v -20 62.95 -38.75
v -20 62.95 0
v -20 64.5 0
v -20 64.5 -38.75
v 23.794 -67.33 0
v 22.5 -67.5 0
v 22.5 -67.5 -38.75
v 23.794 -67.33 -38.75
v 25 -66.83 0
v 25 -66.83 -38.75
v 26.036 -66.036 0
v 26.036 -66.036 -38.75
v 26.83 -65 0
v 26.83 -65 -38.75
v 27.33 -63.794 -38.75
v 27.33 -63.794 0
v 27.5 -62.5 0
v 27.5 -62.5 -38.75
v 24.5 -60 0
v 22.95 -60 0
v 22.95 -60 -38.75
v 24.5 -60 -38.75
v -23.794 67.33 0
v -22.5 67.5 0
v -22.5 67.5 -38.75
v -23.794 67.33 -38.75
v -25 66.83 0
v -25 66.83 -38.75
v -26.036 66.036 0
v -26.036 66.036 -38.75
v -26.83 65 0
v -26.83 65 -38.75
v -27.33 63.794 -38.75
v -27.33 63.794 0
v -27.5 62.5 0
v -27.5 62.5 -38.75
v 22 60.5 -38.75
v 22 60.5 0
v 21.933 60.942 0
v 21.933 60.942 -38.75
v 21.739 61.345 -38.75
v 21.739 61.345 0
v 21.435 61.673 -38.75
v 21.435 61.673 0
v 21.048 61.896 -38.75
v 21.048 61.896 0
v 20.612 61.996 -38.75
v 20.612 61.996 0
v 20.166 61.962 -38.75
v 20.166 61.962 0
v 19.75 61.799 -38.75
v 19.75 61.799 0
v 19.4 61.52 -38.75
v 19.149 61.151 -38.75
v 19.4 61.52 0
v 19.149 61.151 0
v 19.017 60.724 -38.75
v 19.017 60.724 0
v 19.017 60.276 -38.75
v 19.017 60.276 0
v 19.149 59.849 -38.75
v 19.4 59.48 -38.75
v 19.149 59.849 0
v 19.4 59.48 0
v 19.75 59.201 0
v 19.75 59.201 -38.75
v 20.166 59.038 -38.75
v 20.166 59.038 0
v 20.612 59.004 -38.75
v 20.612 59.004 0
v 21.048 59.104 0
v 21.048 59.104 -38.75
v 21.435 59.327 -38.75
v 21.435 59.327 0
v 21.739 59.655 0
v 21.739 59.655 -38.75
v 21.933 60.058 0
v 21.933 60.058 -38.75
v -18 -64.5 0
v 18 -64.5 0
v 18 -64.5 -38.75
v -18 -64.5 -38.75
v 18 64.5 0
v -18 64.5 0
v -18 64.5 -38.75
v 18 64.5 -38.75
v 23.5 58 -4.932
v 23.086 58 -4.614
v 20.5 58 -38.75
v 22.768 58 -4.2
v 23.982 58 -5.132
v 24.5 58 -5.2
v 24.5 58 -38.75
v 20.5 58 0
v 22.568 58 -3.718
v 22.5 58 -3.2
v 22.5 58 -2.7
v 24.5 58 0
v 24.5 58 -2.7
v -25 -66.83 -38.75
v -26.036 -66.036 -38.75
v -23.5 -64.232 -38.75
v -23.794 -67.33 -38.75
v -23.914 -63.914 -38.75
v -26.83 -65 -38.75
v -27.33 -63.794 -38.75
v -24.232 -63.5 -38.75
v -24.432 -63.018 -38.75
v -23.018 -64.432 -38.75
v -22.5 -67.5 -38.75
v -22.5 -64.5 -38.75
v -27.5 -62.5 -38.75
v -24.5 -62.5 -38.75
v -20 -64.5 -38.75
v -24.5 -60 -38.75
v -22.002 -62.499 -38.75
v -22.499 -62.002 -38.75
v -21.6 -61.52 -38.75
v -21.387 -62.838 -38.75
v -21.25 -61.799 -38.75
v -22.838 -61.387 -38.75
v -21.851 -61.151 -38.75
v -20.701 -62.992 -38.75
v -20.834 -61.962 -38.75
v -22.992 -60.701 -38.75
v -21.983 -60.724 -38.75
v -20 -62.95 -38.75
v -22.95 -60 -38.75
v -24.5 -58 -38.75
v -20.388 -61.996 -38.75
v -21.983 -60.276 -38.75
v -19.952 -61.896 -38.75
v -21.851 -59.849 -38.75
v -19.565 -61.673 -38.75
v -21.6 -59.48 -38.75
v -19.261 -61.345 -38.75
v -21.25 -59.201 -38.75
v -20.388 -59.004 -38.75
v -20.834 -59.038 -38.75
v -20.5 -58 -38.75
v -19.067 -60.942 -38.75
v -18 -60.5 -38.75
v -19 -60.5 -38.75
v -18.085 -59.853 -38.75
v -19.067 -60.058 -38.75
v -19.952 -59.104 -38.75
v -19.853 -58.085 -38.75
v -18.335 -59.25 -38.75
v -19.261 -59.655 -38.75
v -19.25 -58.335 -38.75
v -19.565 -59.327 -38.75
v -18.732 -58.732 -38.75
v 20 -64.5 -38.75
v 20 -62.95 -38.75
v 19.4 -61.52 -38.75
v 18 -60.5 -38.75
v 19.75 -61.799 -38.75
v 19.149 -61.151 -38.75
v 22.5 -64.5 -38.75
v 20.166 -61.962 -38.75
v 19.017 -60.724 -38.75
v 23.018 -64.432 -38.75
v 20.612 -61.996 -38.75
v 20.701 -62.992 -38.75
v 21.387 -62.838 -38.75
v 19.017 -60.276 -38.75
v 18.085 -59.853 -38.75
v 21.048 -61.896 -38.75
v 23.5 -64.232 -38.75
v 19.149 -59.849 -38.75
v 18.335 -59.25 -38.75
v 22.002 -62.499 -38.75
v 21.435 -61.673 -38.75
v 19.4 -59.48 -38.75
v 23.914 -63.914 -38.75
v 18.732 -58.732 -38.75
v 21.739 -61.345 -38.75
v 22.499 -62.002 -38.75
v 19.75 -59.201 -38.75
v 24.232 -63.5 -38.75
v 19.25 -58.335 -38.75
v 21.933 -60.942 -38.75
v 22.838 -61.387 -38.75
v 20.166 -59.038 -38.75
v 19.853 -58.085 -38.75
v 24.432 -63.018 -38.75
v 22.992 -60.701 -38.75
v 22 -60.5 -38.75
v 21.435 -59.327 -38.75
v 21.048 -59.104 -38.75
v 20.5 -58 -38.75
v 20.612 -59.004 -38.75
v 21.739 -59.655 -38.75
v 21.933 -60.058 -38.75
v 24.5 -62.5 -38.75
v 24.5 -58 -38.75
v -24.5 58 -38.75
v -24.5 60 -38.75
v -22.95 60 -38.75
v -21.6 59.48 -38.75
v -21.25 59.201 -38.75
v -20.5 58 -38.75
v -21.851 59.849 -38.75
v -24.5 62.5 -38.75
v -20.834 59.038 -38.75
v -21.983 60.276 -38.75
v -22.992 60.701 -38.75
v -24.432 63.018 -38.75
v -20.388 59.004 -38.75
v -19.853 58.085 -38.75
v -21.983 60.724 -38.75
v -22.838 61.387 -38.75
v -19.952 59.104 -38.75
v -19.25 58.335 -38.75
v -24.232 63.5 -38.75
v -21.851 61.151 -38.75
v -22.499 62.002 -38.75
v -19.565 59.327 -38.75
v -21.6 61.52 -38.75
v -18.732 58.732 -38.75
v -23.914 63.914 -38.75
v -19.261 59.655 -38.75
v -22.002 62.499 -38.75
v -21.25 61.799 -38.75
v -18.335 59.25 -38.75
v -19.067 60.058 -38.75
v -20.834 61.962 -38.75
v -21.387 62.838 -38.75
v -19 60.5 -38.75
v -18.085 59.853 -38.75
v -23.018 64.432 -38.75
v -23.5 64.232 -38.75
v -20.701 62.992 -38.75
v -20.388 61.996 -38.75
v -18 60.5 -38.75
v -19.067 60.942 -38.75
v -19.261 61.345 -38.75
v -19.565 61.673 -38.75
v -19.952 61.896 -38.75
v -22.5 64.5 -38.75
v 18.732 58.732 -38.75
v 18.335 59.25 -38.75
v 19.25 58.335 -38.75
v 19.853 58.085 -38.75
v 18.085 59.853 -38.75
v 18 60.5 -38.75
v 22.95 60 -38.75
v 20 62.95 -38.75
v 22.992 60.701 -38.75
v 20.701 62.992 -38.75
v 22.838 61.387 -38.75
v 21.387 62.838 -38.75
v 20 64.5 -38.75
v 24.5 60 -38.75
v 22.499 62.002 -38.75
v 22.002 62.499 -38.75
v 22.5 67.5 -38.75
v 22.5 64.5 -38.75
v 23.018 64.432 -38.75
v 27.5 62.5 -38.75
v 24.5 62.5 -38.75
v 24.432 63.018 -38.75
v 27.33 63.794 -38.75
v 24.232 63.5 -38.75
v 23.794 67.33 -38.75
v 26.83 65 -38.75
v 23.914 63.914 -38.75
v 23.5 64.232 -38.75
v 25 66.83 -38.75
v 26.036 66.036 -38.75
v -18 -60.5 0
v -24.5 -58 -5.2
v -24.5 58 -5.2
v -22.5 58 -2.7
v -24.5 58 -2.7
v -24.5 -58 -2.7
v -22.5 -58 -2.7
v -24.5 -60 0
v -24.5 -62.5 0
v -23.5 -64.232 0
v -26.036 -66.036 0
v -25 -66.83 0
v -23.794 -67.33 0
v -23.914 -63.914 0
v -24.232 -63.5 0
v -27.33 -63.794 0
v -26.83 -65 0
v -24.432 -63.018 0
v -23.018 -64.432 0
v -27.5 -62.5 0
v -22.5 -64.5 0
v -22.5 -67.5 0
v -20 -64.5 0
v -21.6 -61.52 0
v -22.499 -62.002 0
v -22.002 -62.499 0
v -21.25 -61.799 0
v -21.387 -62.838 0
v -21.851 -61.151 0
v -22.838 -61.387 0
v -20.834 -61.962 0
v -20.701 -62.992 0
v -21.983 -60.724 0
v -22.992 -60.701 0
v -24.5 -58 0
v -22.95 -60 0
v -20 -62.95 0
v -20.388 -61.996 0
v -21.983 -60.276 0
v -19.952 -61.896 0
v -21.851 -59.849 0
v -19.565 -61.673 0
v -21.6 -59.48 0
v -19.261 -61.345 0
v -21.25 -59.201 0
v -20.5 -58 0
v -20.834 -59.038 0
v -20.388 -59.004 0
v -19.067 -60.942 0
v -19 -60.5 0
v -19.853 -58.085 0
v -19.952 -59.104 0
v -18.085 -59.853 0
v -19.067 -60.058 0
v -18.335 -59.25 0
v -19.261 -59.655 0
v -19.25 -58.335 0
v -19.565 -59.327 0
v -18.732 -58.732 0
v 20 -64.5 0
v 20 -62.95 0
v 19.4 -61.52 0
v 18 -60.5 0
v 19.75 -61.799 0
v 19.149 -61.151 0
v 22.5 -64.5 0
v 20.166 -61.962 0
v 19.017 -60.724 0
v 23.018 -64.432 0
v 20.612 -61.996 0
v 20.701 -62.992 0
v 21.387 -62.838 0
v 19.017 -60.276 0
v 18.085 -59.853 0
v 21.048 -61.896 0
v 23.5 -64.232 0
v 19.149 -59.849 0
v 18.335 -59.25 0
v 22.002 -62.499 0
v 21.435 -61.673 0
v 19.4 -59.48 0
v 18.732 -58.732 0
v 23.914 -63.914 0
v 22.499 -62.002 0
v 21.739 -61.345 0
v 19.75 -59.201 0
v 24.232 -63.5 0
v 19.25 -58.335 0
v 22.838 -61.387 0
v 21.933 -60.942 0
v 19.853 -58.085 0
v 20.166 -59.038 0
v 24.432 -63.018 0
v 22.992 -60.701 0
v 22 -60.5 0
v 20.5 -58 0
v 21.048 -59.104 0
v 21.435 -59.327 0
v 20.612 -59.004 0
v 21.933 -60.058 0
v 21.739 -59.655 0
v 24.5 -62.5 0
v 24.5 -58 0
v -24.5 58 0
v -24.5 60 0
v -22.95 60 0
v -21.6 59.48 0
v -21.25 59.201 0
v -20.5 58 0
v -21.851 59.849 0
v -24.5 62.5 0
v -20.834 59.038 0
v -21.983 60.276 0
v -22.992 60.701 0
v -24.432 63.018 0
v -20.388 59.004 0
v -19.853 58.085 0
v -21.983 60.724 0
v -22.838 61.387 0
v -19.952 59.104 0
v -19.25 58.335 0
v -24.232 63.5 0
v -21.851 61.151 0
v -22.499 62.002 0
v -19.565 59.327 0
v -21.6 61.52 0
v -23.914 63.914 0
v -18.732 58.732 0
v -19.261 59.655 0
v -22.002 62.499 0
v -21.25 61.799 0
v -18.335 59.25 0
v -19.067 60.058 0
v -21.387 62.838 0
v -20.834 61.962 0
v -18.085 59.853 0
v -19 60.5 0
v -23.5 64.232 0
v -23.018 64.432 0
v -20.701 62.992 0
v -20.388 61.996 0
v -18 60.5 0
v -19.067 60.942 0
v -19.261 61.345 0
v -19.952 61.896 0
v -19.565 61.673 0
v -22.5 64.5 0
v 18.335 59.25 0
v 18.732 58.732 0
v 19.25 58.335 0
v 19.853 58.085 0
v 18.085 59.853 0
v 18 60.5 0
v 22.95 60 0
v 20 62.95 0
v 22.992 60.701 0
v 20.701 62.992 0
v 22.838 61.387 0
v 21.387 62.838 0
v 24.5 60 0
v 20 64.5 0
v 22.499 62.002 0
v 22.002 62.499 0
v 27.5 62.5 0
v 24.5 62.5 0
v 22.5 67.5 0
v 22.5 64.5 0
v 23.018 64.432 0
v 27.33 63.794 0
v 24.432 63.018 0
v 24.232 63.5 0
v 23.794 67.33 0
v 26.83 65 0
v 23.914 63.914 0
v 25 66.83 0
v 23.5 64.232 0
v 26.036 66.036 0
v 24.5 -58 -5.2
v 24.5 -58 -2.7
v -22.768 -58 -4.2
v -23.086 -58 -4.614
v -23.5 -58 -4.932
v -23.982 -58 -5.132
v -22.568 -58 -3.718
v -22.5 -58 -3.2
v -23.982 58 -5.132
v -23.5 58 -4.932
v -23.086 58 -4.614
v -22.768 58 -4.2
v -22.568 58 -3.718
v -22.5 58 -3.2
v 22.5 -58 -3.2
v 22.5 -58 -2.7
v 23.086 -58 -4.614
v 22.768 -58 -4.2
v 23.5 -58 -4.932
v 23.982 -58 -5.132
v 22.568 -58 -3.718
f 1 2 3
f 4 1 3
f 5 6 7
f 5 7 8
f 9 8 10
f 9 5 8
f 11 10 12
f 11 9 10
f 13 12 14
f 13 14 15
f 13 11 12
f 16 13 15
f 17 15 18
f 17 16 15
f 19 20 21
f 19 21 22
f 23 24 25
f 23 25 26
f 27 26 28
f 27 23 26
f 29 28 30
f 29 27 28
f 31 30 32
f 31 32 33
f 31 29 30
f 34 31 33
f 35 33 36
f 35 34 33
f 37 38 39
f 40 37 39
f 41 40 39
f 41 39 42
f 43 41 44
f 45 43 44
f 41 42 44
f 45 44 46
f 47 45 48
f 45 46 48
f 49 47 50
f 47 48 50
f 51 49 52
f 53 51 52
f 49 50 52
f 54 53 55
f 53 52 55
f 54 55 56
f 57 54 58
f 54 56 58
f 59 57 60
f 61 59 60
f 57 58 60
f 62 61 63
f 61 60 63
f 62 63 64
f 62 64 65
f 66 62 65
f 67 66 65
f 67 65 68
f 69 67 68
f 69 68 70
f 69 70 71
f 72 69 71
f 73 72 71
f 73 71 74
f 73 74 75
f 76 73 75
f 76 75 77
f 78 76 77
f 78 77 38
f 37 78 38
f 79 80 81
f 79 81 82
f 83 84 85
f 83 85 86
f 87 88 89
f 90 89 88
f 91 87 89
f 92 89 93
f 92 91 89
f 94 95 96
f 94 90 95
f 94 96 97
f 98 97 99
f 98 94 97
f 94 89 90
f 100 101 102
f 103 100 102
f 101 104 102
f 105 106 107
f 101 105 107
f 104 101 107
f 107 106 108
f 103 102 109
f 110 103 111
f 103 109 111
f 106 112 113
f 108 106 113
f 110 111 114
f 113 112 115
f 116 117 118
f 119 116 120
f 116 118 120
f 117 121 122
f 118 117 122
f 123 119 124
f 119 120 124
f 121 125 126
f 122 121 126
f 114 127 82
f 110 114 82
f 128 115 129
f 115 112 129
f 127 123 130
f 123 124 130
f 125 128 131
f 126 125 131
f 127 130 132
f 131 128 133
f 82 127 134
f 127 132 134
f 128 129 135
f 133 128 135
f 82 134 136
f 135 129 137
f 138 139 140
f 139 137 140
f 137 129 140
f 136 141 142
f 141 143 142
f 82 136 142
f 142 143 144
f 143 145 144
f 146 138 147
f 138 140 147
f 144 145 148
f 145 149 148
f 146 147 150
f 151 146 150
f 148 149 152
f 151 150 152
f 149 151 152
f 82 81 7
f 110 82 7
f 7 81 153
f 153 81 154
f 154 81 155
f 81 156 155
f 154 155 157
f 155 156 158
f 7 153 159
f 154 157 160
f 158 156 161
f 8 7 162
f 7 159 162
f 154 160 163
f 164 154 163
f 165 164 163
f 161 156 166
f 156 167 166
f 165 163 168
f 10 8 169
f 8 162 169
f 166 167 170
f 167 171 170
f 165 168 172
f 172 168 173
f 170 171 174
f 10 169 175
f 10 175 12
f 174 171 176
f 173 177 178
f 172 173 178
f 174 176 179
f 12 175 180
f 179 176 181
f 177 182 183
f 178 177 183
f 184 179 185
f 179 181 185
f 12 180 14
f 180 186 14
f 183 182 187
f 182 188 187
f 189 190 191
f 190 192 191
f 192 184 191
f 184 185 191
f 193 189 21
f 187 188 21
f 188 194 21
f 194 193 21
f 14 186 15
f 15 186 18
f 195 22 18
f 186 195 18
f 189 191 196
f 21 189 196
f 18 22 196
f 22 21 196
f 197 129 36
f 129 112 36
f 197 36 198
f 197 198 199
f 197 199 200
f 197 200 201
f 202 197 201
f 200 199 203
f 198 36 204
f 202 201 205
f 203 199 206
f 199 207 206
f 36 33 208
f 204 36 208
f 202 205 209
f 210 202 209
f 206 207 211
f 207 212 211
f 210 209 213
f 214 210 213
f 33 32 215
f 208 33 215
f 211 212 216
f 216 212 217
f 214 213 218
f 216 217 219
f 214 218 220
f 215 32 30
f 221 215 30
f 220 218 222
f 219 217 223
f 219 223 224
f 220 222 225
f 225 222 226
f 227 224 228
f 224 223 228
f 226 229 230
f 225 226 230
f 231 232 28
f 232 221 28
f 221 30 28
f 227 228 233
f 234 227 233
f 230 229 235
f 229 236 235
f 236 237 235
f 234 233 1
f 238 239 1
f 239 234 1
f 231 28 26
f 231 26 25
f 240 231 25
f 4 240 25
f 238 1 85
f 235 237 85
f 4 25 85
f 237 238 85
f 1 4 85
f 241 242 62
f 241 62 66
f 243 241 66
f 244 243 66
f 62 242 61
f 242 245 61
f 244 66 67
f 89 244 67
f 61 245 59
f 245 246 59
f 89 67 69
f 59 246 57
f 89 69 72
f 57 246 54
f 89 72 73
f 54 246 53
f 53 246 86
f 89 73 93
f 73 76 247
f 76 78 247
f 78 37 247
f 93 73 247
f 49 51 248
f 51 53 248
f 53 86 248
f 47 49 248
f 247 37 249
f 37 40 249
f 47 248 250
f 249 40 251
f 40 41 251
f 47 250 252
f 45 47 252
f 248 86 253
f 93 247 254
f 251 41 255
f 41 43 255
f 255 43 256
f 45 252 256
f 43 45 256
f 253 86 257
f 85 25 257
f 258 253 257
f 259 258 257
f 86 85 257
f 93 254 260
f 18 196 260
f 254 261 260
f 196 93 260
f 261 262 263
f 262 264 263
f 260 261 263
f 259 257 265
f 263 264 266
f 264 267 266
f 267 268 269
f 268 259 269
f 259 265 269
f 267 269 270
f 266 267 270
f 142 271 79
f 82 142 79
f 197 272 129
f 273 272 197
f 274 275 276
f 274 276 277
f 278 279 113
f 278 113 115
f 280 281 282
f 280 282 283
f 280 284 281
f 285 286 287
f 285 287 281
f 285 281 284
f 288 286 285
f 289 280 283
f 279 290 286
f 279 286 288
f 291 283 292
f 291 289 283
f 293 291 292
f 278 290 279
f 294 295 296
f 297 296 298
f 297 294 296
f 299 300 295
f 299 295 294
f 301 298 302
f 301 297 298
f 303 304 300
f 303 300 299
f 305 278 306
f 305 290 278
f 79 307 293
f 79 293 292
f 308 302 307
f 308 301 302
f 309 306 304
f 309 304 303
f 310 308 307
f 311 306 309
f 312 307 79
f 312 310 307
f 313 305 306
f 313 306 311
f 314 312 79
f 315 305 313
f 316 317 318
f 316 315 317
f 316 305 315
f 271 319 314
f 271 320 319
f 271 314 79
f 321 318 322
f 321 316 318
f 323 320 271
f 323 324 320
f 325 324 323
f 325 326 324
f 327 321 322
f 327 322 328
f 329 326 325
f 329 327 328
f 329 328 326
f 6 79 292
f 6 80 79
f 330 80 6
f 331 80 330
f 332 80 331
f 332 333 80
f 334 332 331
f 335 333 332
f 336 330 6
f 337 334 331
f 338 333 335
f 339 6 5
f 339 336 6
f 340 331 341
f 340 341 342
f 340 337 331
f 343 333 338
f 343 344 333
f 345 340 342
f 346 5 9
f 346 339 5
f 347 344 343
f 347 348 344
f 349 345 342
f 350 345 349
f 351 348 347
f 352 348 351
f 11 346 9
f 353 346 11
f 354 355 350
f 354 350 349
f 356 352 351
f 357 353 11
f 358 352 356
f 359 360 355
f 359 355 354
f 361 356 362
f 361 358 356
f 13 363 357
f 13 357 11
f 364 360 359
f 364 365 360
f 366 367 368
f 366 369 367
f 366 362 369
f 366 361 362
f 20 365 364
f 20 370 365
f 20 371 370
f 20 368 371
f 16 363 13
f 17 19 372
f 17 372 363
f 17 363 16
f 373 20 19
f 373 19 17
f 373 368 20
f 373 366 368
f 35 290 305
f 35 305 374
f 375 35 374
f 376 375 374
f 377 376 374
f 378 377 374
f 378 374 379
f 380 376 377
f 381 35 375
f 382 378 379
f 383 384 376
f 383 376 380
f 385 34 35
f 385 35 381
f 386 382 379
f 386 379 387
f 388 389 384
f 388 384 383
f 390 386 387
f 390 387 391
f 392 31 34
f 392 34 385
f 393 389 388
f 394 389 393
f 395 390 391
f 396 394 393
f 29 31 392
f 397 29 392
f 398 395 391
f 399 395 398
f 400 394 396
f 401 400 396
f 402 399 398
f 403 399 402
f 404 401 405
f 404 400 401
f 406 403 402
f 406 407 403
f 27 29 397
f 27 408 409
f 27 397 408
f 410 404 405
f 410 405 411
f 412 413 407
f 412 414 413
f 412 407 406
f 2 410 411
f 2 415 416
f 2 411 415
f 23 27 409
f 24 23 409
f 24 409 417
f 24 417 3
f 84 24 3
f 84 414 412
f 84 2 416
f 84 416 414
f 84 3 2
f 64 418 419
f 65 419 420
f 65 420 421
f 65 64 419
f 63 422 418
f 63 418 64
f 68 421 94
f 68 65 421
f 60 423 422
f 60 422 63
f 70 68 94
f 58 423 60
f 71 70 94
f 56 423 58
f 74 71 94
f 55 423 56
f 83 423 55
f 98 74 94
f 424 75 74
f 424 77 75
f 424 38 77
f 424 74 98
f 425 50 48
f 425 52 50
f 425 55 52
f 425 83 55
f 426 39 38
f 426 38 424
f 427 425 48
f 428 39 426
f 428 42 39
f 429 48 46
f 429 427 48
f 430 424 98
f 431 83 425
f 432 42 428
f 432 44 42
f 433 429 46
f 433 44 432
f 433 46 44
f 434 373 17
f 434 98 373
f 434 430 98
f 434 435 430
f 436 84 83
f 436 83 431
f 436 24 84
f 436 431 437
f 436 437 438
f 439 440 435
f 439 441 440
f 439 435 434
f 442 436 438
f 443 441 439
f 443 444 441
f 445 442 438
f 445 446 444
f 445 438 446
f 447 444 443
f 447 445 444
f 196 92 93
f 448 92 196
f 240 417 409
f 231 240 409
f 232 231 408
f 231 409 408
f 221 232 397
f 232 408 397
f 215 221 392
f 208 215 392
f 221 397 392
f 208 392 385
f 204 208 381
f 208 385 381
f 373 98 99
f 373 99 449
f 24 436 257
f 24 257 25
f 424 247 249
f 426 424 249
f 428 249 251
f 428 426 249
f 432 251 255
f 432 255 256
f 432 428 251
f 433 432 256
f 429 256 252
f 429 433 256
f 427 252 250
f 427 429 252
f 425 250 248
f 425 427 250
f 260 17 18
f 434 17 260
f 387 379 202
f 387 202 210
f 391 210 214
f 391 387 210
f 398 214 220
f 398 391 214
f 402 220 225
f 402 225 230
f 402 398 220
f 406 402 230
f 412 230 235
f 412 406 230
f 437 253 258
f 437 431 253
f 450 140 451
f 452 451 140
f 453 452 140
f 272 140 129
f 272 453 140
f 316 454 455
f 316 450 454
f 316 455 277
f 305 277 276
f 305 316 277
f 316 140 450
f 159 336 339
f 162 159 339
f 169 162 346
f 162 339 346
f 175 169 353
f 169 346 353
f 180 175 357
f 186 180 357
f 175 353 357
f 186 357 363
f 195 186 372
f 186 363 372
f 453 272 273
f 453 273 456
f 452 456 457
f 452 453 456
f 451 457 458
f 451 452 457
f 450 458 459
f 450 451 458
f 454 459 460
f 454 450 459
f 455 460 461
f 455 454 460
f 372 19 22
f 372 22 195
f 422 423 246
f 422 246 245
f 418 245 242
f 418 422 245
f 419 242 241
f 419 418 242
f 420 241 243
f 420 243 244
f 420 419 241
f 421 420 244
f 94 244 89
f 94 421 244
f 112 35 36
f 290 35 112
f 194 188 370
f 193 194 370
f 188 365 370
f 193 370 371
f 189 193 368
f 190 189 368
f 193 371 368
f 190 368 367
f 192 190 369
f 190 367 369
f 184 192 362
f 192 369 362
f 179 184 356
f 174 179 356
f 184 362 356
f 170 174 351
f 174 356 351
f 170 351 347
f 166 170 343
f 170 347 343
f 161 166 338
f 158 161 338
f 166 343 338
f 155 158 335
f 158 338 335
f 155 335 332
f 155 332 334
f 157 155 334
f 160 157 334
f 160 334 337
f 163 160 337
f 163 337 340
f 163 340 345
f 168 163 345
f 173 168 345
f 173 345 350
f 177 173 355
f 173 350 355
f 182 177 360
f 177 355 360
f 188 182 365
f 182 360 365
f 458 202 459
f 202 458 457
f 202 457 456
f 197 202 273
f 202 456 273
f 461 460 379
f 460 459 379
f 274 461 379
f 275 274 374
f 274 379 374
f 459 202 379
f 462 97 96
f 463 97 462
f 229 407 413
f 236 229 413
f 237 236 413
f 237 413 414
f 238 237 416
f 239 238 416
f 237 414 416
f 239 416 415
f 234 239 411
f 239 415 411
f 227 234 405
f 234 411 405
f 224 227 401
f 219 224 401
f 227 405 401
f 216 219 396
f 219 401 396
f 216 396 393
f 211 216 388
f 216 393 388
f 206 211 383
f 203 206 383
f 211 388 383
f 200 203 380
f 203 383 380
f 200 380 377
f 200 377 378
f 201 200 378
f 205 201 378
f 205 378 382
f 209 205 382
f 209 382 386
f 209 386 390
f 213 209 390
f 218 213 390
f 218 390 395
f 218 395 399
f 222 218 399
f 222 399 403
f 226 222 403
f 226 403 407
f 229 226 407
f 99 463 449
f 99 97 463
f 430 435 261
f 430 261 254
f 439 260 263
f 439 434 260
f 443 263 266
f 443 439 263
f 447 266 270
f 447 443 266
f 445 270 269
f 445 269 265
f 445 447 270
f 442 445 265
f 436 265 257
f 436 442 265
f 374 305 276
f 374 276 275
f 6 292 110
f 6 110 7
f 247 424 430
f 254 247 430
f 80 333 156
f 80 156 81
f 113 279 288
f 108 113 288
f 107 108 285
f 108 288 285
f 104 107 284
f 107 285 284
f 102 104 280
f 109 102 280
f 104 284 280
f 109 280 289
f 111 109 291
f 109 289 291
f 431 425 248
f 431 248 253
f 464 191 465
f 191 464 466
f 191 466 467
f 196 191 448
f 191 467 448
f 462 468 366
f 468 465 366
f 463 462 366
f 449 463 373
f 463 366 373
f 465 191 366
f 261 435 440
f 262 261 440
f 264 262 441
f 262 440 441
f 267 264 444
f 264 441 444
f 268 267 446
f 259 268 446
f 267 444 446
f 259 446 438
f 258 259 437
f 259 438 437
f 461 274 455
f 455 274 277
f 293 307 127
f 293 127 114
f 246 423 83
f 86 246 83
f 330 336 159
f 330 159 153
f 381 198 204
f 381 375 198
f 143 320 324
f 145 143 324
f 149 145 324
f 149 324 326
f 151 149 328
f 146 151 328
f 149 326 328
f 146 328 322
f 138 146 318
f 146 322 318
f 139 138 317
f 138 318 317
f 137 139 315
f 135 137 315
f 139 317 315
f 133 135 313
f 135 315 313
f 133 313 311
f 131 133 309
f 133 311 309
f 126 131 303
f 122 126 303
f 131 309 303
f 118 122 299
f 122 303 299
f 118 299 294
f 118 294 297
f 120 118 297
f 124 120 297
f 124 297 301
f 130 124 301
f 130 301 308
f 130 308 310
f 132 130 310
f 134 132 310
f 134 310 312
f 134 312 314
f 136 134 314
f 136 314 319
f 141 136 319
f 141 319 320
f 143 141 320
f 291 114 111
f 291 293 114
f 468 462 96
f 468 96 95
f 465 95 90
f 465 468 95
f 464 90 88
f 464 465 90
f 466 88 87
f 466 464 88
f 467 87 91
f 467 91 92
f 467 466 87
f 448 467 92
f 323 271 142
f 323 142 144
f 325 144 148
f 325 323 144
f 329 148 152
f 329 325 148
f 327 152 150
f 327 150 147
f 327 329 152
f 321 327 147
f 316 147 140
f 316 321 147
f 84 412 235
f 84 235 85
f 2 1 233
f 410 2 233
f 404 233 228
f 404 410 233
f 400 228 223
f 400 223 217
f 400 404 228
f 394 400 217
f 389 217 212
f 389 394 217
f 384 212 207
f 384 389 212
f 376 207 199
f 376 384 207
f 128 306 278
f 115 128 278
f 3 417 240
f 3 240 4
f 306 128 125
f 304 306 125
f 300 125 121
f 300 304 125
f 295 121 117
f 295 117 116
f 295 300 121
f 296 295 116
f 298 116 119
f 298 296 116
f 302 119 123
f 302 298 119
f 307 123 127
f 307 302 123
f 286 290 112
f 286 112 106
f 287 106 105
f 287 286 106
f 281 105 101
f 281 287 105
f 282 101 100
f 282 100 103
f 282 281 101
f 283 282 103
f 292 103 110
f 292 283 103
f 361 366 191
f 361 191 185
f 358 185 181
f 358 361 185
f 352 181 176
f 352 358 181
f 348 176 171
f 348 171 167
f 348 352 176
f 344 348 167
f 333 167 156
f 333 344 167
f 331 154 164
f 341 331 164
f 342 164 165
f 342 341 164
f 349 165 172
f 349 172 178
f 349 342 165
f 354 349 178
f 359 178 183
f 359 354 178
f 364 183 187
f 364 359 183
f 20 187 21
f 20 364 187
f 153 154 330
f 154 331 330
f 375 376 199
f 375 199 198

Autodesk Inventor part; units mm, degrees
ref_plane "YZ Plane" through (0, 0, 0) normal (1, 0, 0) x (0, 1, 0)
sketch "Sketch1" plane through (0, 0, 0) normal (0, 0, 1) x (1, 0, 0)
  line L0 (0, 95.9497) -> (0, -95.9497) construction
  line L1 (-39.9497, 0) -> (39.9497, 0) construction
  arc A0 (22.5, -67.5) -> (27.5, -62.5) centre (22.5, -62.5) ccw
  line L2 (27.5, -62.5) -> (27.5, 62.5)
  arc A1 (27.5, 62.5) -> (22.5, 67.5) centre (22.5, 62.5) ccw
  line L3 (22.5, 67.5) -> (-22.5, 67.5)
  arc A2 (-22.5, 67.5) -> (-27.5, 62.5) centre (-22.5, 62.5) ccw
  line L4 (-27.5, 62.5) -> (-27.5, -62.5)
  arc A3 (-27.5, -62.5) -> (-22.5, -67.5) centre (-22.5, -62.5) ccw
  line L5 (-22.5, -67.5) -> (22.5, -67.5)
  line L6 (24.5, 62.5) -> (24.5, -62.5)
  arc A4 (22.5, -64.5) -> (24.5, -62.5) centre (22.5, -62.5) ccw
  line L7 (22.5, -64.5) -> (-22.5, -64.5)
  arc A5 (-24.5, -62.5) -> (-22.5, -64.5) centre (-22.5, -62.5) ccw
  line L8 (-24.5, -62.5) -> (-24.5, 62.5)
  arc A6 (-22.5, 64.5) -> (-24.5, 62.5) centre (-22.5, 62.5) ccw
  line L9 (-22.5, 64.5) -> (22.5, 64.5)
  arc A7 (24.5, 62.5) -> (22.5, 64.5) centre (22.5, 62.5) ccw
  circle A8 centre (20.5, 60.5) radius 2.5 construction
  line L10 (20.5, 58) -> (24.5, 58)
  line L11 (18, 60.5) -> (18, 64.5)
  line L12 (22.9495, 60) -> (24.5, 60)
  line L13 (20, 62.9495) -> (20, 64.5)
  circle A9 centre (20.5, 60.5) radius 1.5
  arc A10 (22.9495, 60) -> (20, 62.9495) centre (20.5, 60.5) ccw
  arc A11 (18, 60.5) -> (20.5, 58) centre (20.5, 60.5) ccw
  circle A12 centre (20.5, -60.5) radius 2.5 construction
  line L14 (20.5, -58) -> (24.5, -58)
  line L15 (18, -60.5) -> (18, -64.5)
  line L16 (22.9495, -60) -> (24.5, -60)
  line L17 (20, -62.9495) -> (20, -64.5)
  circle A13 centre (20.5, -60.5) radius 1.5
  arc A14 (20, -62.9495) -> (22.9495, -60) centre (20.5, -60.5) ccw
  arc A15 (20.5, -58) -> (18, -60.5) centre (20.5, -60.5) ccw
  circle A16 centre (-20.5, 60.5) radius 2.5 construction
  line L18 (-20.5, 58) -> (-24.5, 58)
  line L19 (-18, 60.5) -> (-18, 64.5)
  line L20 (-22.9495, 60) -> (-24.5, 60)
  line L21 (-20, 62.9495) -> (-20, 64.5)
  circle A17 centre (-20.5, 60.5) radius 1.5
  arc A18 (-20, 62.9495) -> (-22.9495, 60) centre (-20.5, 60.5) ccw
  arc A19 (-20.5, 58) -> (-18, 60.5) centre (-20.5, 60.5) ccw
  line L22 (-20.5, -58) -> (-24.5, -58)
  arc A20 (-18, -60.5) -> (-20.5, -58) centre (-20.5, -60.5) ccw
  line L23 (-22.9495, -60) -> (-24.5, -60)
  circle A21 centre (-20.5, -60.5) radius 1.5
  line L24 (-18, -60.5) -> (-18, -64.5)
  circle A22 centre (-20.5, -60.5) radius 2.5 construction
  arc A23 (-22.9495, -60) -> (-20, -62.9495) centre (-20.5, -60.5) ccw
  line L25 (-20, -62.9495) -> (-20, -64.5)
  line L26 (-24.5, 60) -> (-24.5, 58)
  line L27 (-20, 64.5) -> (-18, 64.5)
  line L28 (24.5, -58) -> (24.5, -60)
  line L29 (18, -64.5) -> (20, -64.5)
  line L30 (-20, -64.5) -> (-18, -64.5)
  line L31 (-24.5, -58) -> (-24.5, -60)
  point P0 (-22.5, -62.5)
  point P1 (-22.5, 62.5)
  dimension "d6" = 3
  dimension "d7" = 5
  dimension "d8" = 7
  dimension "d9" = 7
  dimension "d10" = 2
  dimension "d11" = 2
  dimension "d12" = 3
  dimension "d20" = 55
  dimension "d21" = 135
  dimension "d22" = 5
ref_plane "Work Plane4" through (-27.5, -67.5, 0) normal (0, 0, -1) x (0, 1, 0)
ref_plane "Work Plane5" through (-27.5, -67.5, -58.6068) normal (0, 0, 1) x (1, 0, 0)
extrude "Extrusion1" add sketch "Sketch1" against normal blind 38.75 contours L5 A3 L4 A2 L3 A1 L2 A0 | L6 L10 A11 L11 L9 L13 A10 L12 | L6 L16 A14 L17 L7 L15 A15 L14 | L19 A19 L18 L8 L20 A18 L21 L9 | L7 L25 A23 L23 L8 L22 A20 L24
ref_plane "PLan support PowerPCB" through (0, 0, -2.7) normal (0, 0, 1) x (1, 0, 0)
sketch "Sketch2" plane through (0, 0, -2.7) normal (0, 0, 1) x (1, 0, 0)
  line L0 (24.5, 58) -> (24.5, -58) projected
  line L1 (22.5, 58) -> (22.5, -58)
  line L2 (24.5, 58) -> (22.5, 58)
  line L3 (24.5, -58) -> (22.5, -58)
  line L4 (0, 94.5) -> (0, -94.5) construction
  line L5 (-24.5, 58) -> (-24.5, -58)
  line L6 (-22.5, 58) -> (-22.5, -58)
  line L7 (-24.5, 58) -> (-22.5, 58)
  line L8 (-24.5, -58) -> (-22.5, -58)
  point P0 (0, 0)
  dimension "d15" = 2
extrude "Extrusion2" add sketch "Sketch2" against normal blind 2.5
fillet "Fillet1" radius 2 2 edges at (-22.5, 0, -5.2) (22.5, 0, -5.2)
equation "\"d9\" = d8"
equation "\"d11\" = d10"
equation "\"d13\" = -Top_Plate_Bottom_to_PowerPcb_Bottom"
equation "\"Plate_thickness\" = 3"
equation "\"Top_Plate_Bottom_to_PowerPcb_Bottom\" = 2.7"
properties part number "Box_Body" material "ABS Plastic"
